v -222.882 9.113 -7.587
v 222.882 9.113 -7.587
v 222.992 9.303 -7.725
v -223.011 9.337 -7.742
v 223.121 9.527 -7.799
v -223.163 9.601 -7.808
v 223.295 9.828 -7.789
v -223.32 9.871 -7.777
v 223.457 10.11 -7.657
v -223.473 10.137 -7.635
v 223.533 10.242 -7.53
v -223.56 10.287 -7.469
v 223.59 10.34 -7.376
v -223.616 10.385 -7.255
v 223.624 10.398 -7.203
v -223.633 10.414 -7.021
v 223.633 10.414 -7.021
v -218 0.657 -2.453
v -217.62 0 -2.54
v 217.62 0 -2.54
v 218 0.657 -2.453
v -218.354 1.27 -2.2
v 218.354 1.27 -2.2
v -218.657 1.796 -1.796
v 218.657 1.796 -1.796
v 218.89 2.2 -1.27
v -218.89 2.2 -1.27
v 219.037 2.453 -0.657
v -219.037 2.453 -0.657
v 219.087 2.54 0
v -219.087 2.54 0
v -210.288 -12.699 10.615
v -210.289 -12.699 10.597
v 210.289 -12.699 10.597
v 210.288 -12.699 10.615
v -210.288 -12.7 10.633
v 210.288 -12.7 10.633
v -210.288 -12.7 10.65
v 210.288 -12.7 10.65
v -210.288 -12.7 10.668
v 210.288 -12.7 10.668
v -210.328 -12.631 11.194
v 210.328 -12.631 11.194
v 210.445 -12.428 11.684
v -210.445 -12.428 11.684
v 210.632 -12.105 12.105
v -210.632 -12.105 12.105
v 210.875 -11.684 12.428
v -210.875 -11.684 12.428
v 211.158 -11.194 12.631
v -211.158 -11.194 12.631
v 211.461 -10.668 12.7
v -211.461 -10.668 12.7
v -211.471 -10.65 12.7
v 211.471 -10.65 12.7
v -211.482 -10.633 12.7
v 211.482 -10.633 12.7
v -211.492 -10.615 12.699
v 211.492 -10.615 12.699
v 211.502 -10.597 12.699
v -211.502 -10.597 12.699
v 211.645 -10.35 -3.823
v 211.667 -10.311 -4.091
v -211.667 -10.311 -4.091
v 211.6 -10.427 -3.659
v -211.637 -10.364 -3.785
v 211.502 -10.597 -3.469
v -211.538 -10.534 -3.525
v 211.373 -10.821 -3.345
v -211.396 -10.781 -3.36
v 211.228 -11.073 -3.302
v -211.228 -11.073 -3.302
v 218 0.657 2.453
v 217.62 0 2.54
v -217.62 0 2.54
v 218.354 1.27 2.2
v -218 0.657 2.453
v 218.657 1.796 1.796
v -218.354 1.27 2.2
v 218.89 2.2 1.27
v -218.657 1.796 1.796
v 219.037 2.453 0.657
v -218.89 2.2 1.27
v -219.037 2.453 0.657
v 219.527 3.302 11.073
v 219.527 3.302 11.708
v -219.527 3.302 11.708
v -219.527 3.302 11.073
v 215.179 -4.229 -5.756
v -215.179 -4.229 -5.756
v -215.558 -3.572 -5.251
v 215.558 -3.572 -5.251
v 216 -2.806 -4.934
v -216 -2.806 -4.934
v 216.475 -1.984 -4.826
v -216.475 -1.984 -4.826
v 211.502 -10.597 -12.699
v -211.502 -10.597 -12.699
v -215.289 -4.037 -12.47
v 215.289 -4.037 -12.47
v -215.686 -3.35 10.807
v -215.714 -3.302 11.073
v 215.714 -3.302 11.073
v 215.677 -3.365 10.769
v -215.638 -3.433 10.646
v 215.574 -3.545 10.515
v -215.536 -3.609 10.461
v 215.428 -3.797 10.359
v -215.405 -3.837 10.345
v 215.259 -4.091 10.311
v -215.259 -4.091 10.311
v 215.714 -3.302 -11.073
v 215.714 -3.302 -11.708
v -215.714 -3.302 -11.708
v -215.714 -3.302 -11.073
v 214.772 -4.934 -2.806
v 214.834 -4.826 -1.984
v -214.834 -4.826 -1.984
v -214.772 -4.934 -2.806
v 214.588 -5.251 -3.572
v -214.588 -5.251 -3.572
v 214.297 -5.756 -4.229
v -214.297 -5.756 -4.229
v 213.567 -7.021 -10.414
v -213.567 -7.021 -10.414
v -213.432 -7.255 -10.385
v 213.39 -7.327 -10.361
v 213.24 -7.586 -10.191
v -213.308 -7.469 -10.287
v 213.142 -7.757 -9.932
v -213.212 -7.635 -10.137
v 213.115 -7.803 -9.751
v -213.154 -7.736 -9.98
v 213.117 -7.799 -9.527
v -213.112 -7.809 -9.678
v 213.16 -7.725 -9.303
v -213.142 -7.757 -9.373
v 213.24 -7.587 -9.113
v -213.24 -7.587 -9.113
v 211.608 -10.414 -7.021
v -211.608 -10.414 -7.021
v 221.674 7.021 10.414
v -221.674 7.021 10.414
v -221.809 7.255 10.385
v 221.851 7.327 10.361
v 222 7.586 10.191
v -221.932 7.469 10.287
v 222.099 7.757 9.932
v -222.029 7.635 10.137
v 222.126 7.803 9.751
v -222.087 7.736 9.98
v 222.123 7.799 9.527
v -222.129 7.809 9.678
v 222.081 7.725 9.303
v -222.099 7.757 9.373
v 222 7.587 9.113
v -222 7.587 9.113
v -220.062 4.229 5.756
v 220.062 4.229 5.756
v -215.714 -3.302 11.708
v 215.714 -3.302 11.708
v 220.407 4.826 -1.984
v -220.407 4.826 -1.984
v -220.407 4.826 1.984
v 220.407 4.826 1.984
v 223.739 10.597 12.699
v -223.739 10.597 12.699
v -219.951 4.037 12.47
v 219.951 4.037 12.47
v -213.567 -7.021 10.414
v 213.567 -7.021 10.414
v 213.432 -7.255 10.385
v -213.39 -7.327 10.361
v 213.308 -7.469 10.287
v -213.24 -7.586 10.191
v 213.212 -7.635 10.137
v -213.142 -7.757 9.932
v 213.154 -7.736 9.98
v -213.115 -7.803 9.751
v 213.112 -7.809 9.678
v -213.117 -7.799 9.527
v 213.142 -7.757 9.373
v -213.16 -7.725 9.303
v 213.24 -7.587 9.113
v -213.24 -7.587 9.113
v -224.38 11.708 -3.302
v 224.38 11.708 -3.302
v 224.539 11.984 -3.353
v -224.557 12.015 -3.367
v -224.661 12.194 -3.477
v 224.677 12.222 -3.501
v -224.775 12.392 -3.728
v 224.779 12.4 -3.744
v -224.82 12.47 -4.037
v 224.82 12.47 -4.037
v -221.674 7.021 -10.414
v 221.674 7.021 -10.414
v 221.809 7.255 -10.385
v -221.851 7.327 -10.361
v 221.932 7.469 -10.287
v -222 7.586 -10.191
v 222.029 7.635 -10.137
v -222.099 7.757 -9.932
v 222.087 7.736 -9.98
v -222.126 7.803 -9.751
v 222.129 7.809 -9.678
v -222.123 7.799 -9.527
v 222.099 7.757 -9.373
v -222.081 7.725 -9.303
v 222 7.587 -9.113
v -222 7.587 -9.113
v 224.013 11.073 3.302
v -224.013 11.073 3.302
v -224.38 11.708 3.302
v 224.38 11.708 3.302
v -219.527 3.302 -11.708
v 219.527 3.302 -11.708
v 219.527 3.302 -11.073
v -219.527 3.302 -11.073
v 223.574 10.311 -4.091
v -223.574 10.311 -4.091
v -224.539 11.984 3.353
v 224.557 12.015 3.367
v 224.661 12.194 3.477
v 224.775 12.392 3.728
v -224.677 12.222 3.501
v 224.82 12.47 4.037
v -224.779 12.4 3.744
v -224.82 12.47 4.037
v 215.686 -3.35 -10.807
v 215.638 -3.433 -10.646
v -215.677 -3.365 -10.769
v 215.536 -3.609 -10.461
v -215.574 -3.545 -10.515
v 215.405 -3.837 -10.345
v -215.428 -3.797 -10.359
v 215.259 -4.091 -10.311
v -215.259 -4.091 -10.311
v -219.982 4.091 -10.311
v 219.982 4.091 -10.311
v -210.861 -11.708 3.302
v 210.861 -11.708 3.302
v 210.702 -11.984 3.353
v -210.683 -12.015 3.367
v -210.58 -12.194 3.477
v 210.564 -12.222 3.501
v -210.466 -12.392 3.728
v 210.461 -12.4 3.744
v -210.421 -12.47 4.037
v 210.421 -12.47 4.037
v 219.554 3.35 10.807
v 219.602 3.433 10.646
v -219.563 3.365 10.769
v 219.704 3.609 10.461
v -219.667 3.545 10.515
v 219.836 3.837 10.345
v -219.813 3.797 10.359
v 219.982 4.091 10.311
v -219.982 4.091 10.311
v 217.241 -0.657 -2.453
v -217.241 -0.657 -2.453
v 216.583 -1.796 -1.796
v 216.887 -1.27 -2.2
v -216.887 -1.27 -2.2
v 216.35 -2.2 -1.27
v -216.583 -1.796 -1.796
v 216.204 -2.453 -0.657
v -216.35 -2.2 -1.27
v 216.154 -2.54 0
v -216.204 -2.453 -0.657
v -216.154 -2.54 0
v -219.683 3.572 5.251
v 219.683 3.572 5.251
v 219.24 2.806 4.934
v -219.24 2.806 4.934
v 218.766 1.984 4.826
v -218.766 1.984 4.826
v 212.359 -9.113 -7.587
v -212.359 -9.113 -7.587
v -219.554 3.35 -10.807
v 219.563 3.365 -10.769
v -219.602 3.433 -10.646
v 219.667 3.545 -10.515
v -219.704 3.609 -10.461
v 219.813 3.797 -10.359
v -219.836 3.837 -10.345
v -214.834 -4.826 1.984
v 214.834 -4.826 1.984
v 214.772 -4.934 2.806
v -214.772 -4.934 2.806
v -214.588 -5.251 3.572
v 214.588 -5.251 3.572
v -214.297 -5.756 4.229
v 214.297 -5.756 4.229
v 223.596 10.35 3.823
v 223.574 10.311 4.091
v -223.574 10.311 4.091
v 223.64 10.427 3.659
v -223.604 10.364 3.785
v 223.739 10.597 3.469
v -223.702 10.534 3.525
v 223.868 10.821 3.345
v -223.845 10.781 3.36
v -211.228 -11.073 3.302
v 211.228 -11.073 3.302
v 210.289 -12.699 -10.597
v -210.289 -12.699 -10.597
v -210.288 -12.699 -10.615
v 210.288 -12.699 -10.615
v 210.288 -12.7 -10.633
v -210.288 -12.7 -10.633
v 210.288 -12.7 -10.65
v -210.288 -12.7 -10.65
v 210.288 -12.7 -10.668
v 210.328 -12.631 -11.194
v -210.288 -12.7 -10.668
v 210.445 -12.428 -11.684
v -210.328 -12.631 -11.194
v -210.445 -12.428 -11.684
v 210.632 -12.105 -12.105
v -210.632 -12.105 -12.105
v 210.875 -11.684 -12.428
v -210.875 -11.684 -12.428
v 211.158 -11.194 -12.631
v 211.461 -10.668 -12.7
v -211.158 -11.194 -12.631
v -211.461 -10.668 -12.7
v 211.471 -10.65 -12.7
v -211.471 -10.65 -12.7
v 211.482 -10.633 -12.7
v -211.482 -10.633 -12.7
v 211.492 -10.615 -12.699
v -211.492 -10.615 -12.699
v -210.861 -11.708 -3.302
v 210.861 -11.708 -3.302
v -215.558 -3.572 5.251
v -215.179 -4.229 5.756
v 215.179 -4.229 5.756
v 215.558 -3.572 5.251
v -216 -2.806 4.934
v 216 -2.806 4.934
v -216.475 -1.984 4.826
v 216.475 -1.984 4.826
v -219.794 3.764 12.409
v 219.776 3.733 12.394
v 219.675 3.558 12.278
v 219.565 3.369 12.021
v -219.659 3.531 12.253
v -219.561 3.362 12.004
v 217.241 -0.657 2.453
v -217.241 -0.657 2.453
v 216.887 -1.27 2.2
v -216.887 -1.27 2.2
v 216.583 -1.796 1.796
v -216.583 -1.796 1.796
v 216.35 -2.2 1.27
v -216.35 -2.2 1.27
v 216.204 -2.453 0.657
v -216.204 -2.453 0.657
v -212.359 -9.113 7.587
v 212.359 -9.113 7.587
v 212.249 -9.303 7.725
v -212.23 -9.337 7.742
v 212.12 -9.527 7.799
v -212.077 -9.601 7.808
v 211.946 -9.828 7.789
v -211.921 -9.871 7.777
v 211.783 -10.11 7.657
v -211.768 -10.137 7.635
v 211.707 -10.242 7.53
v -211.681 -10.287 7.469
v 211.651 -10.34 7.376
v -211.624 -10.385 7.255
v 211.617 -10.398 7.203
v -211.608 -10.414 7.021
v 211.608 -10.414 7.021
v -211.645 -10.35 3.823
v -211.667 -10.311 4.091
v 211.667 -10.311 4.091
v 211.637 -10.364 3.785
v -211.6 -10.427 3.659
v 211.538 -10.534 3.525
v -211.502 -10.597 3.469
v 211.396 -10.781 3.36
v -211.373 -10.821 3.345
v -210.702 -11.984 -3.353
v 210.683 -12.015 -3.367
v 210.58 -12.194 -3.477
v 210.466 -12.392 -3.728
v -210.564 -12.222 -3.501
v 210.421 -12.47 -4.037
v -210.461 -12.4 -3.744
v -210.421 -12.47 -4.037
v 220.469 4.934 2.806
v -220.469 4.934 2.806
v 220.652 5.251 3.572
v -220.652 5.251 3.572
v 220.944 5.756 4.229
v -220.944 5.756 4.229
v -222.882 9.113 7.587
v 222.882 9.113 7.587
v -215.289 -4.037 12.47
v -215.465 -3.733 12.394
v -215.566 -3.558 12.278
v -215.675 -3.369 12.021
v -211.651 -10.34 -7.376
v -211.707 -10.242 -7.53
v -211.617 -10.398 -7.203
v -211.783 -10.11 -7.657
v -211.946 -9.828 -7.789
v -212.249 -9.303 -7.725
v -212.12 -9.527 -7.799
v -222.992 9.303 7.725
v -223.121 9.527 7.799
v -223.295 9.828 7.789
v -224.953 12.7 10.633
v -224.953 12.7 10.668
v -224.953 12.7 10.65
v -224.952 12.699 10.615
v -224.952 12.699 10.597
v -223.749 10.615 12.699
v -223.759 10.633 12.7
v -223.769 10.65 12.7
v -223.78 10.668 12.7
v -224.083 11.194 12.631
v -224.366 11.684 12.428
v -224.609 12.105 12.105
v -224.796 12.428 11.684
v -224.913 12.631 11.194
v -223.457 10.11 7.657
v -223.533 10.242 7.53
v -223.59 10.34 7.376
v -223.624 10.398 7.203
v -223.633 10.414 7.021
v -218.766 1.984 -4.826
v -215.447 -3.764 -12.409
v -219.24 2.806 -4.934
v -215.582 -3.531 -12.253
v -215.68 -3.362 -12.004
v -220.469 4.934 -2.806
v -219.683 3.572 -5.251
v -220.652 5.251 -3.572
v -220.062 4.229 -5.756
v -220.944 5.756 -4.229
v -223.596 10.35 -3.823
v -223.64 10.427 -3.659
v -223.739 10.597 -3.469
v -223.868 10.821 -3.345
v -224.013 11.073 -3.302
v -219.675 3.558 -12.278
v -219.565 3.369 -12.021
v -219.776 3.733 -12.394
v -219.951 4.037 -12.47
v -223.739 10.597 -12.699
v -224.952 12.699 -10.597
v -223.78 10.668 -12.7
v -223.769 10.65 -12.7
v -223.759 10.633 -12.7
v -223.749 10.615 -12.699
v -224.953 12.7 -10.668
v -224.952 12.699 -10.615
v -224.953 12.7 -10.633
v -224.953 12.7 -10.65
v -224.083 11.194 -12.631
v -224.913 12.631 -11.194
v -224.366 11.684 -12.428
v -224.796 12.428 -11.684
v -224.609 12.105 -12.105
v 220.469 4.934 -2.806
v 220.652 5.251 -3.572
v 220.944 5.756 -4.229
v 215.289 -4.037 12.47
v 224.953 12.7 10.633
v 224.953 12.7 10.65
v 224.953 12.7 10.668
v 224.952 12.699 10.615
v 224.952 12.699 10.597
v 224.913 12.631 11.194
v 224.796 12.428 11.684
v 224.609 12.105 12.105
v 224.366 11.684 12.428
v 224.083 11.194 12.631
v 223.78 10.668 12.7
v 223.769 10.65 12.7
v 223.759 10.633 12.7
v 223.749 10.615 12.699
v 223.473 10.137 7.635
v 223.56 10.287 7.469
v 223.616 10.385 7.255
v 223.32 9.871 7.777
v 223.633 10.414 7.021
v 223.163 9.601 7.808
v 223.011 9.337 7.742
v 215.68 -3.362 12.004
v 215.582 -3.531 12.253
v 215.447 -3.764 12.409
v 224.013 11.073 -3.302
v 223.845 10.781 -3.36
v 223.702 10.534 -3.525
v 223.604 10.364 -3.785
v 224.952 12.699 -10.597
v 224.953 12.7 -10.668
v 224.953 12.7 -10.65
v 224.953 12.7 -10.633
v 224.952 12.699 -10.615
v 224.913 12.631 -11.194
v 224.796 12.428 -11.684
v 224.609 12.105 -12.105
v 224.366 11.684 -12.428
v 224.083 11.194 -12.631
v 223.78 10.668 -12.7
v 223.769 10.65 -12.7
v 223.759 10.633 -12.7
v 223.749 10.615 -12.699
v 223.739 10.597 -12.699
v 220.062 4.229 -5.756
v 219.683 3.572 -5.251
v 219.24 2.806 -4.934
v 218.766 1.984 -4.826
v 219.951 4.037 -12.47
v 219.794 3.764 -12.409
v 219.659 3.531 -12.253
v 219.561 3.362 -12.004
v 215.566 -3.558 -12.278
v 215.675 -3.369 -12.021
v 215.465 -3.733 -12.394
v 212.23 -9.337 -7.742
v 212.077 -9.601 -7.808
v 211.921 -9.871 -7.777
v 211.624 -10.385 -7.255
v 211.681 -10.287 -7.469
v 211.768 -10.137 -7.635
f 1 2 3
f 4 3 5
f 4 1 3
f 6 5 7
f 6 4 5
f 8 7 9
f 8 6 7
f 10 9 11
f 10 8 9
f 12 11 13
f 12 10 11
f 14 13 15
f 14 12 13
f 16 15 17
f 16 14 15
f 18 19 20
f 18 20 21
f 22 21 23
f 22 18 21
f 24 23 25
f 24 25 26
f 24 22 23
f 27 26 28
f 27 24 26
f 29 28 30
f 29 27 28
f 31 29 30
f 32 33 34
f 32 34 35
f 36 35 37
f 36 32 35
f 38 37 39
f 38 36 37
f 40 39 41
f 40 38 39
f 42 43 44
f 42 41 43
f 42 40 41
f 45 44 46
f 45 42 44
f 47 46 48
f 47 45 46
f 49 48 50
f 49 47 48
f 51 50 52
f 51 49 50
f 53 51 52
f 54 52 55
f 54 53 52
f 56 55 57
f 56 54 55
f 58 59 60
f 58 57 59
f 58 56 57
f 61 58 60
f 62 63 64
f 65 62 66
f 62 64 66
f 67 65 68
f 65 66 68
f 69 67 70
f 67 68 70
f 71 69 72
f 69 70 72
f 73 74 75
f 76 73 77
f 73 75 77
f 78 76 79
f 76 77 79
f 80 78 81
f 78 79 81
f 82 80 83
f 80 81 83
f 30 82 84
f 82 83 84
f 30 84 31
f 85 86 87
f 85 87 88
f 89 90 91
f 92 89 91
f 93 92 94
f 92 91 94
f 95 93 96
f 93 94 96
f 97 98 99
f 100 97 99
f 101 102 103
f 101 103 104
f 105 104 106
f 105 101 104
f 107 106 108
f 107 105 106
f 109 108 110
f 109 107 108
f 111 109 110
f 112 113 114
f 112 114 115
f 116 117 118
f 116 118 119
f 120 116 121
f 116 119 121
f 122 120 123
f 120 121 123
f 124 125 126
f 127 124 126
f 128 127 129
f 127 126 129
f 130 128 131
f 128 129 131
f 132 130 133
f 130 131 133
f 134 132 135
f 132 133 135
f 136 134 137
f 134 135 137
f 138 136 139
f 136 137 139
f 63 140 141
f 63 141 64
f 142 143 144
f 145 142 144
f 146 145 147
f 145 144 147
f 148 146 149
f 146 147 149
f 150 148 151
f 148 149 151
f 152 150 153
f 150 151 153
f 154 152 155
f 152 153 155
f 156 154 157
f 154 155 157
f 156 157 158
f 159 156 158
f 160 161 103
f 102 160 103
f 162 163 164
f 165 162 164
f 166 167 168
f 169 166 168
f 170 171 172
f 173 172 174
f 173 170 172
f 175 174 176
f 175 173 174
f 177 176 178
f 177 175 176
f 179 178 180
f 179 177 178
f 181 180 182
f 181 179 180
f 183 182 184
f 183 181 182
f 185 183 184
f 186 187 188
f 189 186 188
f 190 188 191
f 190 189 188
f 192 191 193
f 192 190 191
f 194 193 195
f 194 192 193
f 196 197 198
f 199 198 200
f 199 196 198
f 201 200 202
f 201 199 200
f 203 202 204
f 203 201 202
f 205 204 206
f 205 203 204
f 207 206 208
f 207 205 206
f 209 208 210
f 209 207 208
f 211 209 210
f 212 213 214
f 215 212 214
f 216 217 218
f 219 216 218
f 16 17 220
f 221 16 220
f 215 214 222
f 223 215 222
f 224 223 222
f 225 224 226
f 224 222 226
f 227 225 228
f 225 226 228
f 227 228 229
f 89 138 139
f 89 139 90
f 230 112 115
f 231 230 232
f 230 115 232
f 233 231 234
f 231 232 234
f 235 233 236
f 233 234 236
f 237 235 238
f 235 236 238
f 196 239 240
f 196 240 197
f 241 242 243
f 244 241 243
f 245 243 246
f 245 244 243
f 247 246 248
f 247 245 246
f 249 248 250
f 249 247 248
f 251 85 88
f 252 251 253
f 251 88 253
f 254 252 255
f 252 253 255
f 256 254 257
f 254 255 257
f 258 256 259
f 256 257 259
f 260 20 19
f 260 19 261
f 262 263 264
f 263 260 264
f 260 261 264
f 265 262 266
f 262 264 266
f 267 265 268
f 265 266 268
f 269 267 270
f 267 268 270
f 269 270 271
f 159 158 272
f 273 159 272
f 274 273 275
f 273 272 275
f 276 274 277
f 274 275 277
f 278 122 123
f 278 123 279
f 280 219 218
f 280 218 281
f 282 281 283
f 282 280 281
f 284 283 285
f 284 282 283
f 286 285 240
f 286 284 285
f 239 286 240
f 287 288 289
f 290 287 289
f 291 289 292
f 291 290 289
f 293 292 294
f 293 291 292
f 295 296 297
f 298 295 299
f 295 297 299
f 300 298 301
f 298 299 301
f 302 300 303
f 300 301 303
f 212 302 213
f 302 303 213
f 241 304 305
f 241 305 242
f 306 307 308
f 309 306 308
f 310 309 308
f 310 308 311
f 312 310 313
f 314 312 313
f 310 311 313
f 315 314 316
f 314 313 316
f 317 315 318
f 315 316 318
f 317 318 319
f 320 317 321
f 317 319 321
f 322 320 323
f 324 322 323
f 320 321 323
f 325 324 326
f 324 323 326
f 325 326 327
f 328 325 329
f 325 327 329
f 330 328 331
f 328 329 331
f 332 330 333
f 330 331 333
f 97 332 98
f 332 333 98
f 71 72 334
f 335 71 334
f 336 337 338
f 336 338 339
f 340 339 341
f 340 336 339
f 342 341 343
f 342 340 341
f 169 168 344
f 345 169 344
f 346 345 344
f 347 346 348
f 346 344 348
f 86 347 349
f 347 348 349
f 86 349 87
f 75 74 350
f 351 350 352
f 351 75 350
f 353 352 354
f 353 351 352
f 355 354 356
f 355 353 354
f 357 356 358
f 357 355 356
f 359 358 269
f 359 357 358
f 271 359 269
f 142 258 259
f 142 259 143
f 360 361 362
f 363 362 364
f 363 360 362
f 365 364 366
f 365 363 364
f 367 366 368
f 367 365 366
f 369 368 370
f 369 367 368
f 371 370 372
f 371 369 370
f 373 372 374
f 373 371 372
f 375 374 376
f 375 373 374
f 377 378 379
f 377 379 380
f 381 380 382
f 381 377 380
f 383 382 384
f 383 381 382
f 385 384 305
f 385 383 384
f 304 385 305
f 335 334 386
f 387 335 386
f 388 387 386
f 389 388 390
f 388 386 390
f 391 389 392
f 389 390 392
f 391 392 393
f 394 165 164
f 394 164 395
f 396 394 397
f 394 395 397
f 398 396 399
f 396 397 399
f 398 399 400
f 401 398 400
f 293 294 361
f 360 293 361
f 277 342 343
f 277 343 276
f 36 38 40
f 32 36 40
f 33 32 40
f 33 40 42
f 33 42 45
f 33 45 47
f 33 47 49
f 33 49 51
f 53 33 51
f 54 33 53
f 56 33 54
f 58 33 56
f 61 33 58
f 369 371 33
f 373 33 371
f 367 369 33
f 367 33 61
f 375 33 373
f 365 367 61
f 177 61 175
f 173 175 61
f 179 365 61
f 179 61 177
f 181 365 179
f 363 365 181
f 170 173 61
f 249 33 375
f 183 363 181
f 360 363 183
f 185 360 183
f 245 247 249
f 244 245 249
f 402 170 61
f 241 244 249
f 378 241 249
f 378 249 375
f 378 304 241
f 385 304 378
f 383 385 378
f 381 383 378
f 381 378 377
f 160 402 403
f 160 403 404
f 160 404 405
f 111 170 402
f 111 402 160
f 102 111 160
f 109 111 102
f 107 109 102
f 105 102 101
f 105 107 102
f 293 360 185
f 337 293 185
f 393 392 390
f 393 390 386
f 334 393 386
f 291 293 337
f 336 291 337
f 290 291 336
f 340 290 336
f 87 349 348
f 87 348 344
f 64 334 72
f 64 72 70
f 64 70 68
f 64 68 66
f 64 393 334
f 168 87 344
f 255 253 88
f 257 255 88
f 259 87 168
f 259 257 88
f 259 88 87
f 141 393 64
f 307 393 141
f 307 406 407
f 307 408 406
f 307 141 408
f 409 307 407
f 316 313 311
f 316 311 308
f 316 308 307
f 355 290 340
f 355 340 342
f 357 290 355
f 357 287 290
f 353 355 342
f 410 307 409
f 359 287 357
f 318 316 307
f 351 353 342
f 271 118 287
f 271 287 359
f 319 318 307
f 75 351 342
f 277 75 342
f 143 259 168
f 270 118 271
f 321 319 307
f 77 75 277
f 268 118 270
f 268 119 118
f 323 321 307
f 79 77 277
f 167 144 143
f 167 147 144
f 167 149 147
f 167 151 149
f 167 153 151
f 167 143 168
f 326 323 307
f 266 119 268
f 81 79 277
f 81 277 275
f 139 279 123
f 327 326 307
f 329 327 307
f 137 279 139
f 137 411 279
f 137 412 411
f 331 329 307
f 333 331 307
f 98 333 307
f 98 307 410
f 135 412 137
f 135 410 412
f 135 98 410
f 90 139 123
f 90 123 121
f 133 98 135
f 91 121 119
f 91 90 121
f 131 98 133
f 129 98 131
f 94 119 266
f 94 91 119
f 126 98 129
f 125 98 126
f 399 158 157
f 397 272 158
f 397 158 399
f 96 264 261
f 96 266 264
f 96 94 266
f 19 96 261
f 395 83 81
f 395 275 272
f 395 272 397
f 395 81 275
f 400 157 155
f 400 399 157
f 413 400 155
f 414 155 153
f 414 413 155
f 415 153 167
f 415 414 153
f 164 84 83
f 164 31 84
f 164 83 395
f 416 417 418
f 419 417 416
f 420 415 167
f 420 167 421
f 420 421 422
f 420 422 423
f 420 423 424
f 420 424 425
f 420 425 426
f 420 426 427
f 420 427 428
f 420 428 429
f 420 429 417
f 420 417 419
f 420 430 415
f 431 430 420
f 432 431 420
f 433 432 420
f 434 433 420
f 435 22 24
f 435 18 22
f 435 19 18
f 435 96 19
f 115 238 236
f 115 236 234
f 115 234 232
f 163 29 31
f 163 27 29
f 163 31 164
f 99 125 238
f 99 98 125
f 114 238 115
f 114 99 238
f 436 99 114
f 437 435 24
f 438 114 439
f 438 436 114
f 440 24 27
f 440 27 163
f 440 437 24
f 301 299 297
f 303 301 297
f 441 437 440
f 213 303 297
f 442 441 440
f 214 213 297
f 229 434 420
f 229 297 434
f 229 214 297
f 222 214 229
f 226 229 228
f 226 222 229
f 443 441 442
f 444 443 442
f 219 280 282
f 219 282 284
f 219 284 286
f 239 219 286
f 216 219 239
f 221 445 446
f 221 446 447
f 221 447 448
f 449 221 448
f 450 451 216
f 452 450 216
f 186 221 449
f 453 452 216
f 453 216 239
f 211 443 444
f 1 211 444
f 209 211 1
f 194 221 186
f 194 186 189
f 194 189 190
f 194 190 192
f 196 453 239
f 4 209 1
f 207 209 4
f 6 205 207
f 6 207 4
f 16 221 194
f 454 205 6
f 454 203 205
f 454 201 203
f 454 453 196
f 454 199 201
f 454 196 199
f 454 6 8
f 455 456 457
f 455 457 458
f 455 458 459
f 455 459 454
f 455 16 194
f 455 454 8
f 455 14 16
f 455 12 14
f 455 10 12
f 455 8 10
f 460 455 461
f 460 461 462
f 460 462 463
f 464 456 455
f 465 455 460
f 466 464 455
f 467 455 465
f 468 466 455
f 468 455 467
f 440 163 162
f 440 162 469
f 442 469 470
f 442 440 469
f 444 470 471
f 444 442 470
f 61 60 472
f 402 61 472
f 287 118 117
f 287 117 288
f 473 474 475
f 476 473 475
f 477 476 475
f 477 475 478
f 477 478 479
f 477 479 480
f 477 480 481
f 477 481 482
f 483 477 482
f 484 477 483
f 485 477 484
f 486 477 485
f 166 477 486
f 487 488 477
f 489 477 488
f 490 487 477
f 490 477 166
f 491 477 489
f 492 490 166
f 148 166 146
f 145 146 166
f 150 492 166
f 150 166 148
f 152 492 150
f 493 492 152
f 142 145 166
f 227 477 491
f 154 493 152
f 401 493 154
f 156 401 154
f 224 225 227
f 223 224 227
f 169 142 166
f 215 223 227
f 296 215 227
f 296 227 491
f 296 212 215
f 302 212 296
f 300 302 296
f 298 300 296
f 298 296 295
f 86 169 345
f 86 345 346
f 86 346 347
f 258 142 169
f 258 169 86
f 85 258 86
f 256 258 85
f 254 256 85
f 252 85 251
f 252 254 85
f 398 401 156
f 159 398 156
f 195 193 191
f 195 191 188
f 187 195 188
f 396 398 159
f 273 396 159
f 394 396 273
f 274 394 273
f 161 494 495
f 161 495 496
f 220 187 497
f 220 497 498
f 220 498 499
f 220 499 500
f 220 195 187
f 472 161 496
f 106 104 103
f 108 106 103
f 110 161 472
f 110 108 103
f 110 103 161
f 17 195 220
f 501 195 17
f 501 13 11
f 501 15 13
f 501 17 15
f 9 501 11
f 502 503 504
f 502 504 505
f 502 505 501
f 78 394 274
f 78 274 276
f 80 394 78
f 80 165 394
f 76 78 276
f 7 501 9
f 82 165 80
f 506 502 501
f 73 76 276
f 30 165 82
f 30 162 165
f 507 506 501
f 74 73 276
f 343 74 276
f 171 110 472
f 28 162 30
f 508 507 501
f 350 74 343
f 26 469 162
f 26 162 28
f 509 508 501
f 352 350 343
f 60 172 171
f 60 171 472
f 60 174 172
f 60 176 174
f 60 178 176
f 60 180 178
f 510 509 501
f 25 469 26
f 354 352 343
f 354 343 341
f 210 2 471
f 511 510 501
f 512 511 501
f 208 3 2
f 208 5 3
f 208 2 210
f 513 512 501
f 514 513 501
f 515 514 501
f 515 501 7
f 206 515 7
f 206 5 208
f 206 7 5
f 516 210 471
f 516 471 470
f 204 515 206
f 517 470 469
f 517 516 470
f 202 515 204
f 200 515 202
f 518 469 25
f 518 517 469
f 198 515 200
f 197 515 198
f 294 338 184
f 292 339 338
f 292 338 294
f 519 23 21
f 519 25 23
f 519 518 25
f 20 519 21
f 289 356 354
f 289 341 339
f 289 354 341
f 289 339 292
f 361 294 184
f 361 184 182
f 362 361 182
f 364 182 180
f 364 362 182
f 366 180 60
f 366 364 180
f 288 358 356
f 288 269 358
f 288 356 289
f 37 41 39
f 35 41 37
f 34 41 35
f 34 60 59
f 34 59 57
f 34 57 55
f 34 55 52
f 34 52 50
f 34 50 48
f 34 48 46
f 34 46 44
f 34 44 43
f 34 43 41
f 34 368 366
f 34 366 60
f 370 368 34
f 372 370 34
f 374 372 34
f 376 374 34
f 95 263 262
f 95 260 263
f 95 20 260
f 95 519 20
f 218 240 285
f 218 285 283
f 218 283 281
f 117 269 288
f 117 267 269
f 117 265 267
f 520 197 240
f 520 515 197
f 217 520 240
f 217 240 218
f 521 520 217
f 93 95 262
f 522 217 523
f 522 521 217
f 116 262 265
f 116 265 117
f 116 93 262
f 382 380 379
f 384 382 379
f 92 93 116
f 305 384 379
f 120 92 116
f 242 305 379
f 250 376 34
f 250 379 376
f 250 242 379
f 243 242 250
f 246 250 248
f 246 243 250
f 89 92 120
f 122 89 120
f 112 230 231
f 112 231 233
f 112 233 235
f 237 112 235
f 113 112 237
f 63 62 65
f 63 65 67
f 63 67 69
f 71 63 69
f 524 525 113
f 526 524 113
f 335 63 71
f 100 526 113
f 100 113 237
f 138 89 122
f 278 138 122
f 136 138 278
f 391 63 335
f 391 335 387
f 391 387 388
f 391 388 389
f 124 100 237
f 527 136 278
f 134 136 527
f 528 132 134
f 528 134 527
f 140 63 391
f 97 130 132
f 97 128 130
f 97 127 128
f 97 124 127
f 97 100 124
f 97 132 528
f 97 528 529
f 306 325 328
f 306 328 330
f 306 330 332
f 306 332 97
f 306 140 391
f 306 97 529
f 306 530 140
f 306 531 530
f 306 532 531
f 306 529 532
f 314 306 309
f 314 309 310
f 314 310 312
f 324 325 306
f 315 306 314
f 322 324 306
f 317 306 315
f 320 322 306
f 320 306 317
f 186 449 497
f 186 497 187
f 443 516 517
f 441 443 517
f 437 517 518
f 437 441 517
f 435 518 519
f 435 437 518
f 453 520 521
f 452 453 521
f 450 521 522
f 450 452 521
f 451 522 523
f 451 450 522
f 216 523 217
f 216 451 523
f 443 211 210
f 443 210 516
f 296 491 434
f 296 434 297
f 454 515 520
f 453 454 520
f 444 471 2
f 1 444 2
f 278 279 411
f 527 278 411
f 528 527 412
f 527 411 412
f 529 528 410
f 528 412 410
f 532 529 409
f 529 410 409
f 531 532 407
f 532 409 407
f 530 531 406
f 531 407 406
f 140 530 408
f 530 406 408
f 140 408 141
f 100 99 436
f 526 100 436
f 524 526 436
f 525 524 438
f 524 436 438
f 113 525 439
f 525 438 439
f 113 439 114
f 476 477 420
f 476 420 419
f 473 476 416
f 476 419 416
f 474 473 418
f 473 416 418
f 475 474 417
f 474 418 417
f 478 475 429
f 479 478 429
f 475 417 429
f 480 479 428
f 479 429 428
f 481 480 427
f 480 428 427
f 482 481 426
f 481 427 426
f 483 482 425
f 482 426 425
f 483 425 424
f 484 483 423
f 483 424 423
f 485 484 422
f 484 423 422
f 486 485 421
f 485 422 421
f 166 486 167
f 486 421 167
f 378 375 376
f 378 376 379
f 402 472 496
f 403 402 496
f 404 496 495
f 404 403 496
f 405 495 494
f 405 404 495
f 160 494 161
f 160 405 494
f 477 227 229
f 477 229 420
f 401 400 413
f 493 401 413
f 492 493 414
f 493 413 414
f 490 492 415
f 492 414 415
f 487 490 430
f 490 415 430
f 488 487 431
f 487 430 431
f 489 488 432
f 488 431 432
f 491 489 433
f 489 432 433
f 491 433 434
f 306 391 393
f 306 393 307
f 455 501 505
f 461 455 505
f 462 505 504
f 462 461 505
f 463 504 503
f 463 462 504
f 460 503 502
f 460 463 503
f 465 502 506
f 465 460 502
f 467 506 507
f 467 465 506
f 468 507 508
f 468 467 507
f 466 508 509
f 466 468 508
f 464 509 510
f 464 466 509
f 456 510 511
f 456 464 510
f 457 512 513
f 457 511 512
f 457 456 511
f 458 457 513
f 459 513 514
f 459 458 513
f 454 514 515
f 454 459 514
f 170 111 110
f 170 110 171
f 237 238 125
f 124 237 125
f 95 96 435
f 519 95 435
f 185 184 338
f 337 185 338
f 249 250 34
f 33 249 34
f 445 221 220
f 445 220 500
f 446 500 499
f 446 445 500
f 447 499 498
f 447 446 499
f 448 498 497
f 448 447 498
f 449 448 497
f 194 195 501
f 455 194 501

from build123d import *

# Parameters (mm, degrees)
BOSS_EXTRUDE1_DEPTH      = 224.952724
BOSS_EXTRUDE1_DEPTH_BACK = 224.952724
CUT_EXTRUDE1_DEPTH       = 12.7
CUT_EXTRUDE1_DEPTH_BACK  = 12.7


with BuildPart() as part:
    # Sketch3 → Boss-Extrude1 (new, two sides: drawn at the far end of the back side and taken through both)
    with BuildSketch(Plane(origin=(0, 0, 0), x_dir=(0, 0, -1), z_dir=(1, 0, 0)).offset(-BOSS_EXTRUDE1_DEPTH_BACK)):
        with BuildLine():
            Line((0, 4.826), (1.984228399, 4.826))
            ThreePointArc((1.984228399, 4.826), (3.199248297, 5.067682484), (4.229292429, 5.75593597))
            Line((4.229292429, 5.75593597), (7.586577723, 9.113221264))
            ThreePointArc((7.586577723, 9.113221264), (7.746562132, 9.955883421), (7.021168939, 10.413572441))
            Line((7.021168939, 10.413572441), (4.090593416, 10.311234489))
            ThreePointArc((4.090593416, 10.311234489), (3.534670322, 10.524633371), (3.302, 11.072770299))
            Line((3.302, 11.072770299), (3.302, 11.70815736))
            ThreePointArc((3.302, 11.70815736), (3.515863072, 12.237487038), (4.037406584, 12.46969317))
            Line((4.037406584, 12.46969317), (10.597084223, 12.698762161))
            ThreePointArc((10.597084223, 12.698762161), (12.104840979, 12.104840979), (12.698762161, 10.597084223))
            Line((12.698762161, 10.597084223), (12.46969317, 4.037406584))
            ThreePointArc((12.46969317, 4.037406584), (12.237487038, 3.515863072), (11.70815736, 3.302))
            Line((11.70815736, 3.302), (11.072770299, 3.302))
            ThreePointArc((11.072770299, 3.302), (10.524633371, 3.534670322), (10.311234489, 4.090593416))
            Line((10.311234489, 4.090593416), (10.413572441, 7.021168939))
            ThreePointArc((10.413572441, 7.021168939), (9.955883421, 7.746562132), (9.113221264, 7.586577723))
            Line((9.113221264, 7.586577723), (5.75593597, 4.229292429))
            ThreePointArc((5.75593597, 4.229292429), (5.067682484, 3.199248297), (4.826, 1.984228399))
            Line((4.826, 1.984228399), (4.826, 0))
            Line((4.826, 0), (2.54, 0))
            ThreePointArc((2.54, 0), (1.796051224, 1.796051224), (0, 2.54))
            Line((0, 2.54), (0, 4.826))
        make_face()
    extrude(amount=BOSS_EXTRUDE1_DEPTH + BOSS_EXTRUDE1_DEPTH_BACK)

    # Mirror1: part across plane


with BuildPart() as part_1:
    add(part.part)
    add(part.part.mirror(Plane.ZX))

    # Mirror2: part across plane


with BuildPart() as part_2:
    add(part_1.part)
    add(part_1.part.mirror(Plane.XY))

    # Sketch4 → Cut-Extrude1 (cut, two sides: drawn at the far end of the back side and taken through both)
    with BuildSketch(Plane.XY.offset(-CUT_EXTRUDE1_DEPTH_BACK)):
        Polygon((-227.492724098, -38.1), (227.492724098, -38.1), (227.492724098, 12.7), (224.952724098, 12.7), (210.288027261, -12.7), (-210.288027261, -12.7), (-224.952724098, 12.7), (-227.492724098, 12.7), align=None)
    extrude(amount=CUT_EXTRUDE1_DEPTH + CUT_EXTRUDE1_DEPTH_BACK, mode=Mode.SUBTRACT)


solid = part_2.part
